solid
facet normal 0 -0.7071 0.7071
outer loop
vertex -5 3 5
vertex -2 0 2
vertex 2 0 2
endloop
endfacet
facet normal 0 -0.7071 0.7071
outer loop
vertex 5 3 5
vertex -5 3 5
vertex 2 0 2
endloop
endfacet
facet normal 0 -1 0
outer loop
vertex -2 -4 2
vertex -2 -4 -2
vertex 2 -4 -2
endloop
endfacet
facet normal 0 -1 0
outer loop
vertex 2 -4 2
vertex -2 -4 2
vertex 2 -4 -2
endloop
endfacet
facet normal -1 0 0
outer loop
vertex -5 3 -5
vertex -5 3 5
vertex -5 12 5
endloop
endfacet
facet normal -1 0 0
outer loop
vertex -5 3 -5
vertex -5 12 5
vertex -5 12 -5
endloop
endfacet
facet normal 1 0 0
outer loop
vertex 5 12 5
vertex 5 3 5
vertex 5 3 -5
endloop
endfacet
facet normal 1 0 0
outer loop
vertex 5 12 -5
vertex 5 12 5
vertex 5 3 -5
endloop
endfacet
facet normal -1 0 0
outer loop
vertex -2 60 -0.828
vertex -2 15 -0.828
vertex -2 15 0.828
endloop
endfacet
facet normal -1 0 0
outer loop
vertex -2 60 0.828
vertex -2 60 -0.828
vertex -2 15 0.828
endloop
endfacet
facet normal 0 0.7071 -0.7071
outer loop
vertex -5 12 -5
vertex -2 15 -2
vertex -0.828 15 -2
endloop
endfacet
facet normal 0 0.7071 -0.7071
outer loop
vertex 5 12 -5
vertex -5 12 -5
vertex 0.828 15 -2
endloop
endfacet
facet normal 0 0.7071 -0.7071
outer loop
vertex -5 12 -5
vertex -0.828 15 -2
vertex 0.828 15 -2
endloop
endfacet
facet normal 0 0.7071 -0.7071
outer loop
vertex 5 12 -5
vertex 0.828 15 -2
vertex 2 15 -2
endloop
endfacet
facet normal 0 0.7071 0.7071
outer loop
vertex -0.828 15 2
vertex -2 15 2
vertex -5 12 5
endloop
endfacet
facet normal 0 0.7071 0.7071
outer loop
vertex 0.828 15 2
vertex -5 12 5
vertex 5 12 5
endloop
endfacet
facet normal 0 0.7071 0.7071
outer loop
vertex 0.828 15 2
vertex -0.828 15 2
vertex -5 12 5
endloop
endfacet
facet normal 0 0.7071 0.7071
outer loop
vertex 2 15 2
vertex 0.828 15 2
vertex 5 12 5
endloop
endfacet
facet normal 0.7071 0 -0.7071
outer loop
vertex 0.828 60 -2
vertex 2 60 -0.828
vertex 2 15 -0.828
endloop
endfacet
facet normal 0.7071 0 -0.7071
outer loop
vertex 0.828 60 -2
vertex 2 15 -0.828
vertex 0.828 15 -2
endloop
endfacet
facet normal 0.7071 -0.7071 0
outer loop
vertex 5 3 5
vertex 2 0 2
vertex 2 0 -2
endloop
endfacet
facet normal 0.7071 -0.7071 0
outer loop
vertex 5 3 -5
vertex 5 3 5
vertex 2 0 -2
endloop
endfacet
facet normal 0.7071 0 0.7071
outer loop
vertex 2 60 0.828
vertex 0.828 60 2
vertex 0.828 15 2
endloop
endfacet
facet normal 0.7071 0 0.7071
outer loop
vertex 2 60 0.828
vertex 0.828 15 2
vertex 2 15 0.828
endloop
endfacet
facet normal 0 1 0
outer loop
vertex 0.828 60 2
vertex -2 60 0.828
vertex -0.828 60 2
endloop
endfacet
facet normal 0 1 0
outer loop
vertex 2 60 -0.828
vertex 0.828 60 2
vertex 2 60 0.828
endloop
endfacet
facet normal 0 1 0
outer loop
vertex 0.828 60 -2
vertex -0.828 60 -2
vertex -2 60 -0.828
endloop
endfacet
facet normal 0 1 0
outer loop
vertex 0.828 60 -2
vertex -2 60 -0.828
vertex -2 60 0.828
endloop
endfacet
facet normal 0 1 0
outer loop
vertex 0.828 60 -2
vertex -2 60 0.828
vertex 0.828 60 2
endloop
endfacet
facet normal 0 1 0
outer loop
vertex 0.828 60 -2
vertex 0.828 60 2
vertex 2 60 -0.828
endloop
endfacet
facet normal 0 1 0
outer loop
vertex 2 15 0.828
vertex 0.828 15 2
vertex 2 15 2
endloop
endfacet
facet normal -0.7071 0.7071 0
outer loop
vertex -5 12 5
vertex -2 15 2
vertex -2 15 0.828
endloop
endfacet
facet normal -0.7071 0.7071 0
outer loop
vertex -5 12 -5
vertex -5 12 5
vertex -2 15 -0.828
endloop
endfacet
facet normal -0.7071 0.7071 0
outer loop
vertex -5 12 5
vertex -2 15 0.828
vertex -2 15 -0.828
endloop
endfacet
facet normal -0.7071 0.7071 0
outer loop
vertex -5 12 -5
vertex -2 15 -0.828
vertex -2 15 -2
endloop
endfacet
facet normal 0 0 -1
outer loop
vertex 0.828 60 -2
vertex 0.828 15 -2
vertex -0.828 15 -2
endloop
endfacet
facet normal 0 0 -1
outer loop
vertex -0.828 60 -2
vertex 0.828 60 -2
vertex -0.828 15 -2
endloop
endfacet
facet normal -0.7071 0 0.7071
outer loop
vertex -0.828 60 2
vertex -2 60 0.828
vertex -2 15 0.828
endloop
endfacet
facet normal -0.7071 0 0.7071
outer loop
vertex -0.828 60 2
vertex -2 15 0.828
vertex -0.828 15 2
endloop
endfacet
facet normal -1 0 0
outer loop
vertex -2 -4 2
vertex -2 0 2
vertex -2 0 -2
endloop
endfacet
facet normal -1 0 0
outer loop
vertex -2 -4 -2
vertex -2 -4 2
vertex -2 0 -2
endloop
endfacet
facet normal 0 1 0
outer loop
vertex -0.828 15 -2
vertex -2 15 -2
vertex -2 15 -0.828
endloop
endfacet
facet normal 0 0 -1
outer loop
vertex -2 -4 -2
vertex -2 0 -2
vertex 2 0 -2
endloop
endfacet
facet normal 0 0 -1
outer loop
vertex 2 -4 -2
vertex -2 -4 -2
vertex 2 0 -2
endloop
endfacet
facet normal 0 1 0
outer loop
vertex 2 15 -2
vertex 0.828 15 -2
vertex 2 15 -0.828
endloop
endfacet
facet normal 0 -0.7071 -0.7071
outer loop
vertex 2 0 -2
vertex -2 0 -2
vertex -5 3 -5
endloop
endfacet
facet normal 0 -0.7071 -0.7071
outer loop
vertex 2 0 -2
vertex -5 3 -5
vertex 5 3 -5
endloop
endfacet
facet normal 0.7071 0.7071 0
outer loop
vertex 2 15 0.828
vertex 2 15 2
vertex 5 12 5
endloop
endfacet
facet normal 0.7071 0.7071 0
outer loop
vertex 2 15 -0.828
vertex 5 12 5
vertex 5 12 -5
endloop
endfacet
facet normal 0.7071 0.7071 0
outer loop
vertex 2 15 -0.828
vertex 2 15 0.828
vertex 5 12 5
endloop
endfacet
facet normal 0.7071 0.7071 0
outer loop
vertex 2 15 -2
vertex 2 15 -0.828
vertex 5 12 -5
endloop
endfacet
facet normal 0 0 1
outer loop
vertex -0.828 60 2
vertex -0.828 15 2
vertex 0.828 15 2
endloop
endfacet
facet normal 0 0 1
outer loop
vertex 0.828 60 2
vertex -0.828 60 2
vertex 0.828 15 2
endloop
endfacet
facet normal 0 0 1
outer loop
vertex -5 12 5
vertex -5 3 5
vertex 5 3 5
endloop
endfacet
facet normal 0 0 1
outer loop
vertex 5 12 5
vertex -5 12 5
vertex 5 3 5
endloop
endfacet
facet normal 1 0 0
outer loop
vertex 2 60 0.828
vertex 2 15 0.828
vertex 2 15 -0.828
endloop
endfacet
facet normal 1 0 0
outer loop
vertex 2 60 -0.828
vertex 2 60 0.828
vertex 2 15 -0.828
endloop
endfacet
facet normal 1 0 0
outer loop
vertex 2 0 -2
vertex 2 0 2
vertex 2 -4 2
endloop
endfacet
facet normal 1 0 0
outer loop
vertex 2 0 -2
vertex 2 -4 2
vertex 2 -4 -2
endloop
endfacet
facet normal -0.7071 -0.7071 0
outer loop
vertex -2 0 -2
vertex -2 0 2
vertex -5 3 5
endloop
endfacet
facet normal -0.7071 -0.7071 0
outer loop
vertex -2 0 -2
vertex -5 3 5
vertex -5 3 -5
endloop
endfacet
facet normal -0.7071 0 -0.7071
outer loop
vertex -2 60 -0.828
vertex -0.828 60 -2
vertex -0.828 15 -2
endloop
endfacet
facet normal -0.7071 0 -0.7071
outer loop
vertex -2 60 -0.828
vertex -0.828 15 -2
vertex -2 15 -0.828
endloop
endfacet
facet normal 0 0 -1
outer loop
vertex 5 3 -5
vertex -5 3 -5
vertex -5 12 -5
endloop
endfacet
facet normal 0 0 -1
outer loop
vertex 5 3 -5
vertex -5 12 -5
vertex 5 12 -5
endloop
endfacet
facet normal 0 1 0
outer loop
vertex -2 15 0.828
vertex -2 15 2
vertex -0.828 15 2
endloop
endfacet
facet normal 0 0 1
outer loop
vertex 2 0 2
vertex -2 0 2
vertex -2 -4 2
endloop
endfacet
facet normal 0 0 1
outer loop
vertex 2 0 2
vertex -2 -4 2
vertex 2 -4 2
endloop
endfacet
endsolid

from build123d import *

# Parameters (mm, degrees)
SKETCH5_W            = 10
SKETCH5_H            = 10
BOSS_EXTRUDE6_DEPTH  = 8
CHAMFER10_SIZE       = 3
SKETCH6_W            = 4
SKETCH6_H            = 4
BOSS_EXTRUDE7_DEPTH  = 4
SKETCH7_W            = 10
SKETCH7_H            = 10
BOSS_EXTRUDE9_DEPTH  = 7
CHAMFER13_SIZE       = 3
BOSS_EXTRUDE11_DEPTH = 45


with BuildPart() as part:
    # Sketch5 → Boss-Extrude6 (new body)
    with BuildSketch(Plane(origin=(0, 0, 0), x_dir=(1, 0, 0), z_dir=(0, 1, 0))):
        Rectangle(SKETCH5_W, SKETCH5_H)
    extrude(amount=BOSS_EXTRUDE6_DEPTH)

    # Chamfer10
    chamfer10_edges = [part.edges().sort_by_distance(p)[0] for p in [
        (0, 0, 5),
        (-5, 0, 0),
        (0, 0, -5),
        (5, 0, 0),
    ]]
    chamfer(chamfer10_edges, length=CHAMFER10_SIZE)

    # Sketch6 → Boss-Extrude7 (add)
    with BuildSketch(Plane(origin=(0, 0, 0), x_dir=(1, 0, 0), z_dir=(0, 1, 0))):
        Rectangle(SKETCH6_W, SKETCH6_H)
    extrude(amount=-BOSS_EXTRUDE7_DEPTH)

    # Sketch7 → Boss-Extrude9 (add)
    with BuildSketch(Plane(origin=(0, 8, 0), x_dir=(1, 0, 0), z_dir=(0, 1, 0))):
        Rectangle(SKETCH7_W, SKETCH7_H)
    extrude(amount=BOSS_EXTRUDE9_DEPTH)

    # Chamfer13
    chamfer13_edges = [part.edges().sort_by_distance(p)[0] for p in [
        (-5, 15, 0),
        (0, 15, 5),
        (5, 15, 0),
        (0, 15, -5),
    ]]
    chamfer(chamfer13_edges, length=CHAMFER13_SIZE)

    # Sketch8 → Boss-Extrude11 (add)
    with BuildSketch(Plane(origin=(0, 15, 0), x_dir=(1, 0, 0), z_dir=(0, 1, 0))):
        Polygon((2, 0.828427125), (0.828427125, 2), (-0.828427125, 2), (-2, 0.828427125), (-2, -0.828427125), (-0.828427125, -2), (0.828427125, -2), (2, -0.828427125), align=None)
    extrude(amount=BOSS_EXTRUDE11_DEPTH)


solid = part.part
